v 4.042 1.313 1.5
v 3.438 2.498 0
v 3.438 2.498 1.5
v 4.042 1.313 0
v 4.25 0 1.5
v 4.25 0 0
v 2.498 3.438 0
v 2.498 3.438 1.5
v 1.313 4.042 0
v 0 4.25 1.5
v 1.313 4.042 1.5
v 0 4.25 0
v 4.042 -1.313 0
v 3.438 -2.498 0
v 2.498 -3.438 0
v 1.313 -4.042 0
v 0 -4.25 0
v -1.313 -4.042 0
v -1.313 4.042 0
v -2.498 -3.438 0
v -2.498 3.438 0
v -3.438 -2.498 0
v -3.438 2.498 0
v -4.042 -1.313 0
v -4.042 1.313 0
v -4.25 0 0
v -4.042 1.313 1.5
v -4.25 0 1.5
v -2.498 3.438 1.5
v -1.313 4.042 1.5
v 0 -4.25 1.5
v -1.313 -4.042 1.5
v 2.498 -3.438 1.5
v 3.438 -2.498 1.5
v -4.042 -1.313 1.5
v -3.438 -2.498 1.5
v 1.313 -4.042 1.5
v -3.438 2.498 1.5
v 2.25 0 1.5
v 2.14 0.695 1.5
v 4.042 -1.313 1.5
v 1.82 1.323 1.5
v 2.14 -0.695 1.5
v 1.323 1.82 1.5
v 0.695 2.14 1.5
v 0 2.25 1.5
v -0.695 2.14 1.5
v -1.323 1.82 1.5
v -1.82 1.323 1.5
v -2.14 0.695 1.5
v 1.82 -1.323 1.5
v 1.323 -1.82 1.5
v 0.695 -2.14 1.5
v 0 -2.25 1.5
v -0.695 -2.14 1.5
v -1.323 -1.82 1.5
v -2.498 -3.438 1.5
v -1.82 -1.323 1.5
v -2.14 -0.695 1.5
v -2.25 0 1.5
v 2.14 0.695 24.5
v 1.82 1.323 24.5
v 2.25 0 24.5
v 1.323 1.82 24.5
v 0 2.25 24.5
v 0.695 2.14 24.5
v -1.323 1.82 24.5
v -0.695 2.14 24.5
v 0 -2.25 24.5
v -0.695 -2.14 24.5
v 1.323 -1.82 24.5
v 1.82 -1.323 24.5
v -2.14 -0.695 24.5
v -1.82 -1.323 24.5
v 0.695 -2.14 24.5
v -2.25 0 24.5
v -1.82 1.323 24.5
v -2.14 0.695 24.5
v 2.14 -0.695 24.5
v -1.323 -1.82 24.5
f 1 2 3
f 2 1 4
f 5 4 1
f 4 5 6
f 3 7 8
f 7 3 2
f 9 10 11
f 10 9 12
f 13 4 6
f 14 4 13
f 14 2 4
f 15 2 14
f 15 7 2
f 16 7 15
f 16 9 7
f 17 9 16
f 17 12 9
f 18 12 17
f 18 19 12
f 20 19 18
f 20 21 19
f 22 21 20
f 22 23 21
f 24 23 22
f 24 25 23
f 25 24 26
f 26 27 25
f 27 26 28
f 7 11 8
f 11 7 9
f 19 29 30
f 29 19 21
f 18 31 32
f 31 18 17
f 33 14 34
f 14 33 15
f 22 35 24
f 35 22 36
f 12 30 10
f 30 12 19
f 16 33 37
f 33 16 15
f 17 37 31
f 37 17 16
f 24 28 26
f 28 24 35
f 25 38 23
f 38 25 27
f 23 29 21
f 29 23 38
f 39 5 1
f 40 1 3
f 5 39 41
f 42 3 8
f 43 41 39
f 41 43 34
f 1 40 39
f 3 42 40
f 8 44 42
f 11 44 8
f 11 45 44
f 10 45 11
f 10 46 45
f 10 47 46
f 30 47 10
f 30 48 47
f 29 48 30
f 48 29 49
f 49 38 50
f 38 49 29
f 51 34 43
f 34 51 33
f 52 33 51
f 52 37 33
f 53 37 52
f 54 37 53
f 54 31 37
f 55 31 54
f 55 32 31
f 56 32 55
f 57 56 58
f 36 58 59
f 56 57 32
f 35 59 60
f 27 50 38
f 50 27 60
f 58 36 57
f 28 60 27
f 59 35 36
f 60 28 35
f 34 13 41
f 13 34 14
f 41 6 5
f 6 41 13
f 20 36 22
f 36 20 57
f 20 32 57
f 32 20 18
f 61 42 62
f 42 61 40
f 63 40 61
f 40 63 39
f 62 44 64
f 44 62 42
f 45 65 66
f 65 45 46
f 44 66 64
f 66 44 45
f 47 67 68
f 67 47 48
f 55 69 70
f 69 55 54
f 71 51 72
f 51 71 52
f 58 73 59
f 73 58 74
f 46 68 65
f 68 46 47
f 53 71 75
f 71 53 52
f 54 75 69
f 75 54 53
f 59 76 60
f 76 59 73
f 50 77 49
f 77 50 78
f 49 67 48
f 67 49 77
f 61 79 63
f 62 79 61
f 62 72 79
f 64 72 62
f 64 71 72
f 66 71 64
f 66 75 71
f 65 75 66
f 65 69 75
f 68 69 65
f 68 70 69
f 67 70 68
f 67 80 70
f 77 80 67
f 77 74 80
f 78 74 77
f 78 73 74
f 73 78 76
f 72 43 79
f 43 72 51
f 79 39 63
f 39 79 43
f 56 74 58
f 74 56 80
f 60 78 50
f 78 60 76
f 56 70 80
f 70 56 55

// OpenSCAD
// file: joystick_defines.scad
/*
	OpenJoystick - A project creating affordable, open source, 3D-printable custom flight-sim joysticks for everyone
	Copyright (C) 2012 Travis John Howse

	This program is free software: you can redistribute it and/or modify
	it under the terms of the GNU General Public License as published by
	the Free Software Foundation, either version 3 of the License, or
	(at your option) any later version.

	This program is distributed in the hope that it will be useful,
	but WITHOUT ANY WARRANTY; without even the implied warranty of
	MERCHANTABILITY or FITNESS FOR A PARTICULAR PURPOSE.  See the
	GNU General Public License for more details.

	You should have received a copy of the GNU General Public License
	along with this program.  If not, see <http://www.gnu.org/licenses/>.
*/

// Standard skate bearing
bearing_inside_dia = 8;
bearing_outside_dia = 22;
bearing_thickness = 7;

// Arbitrary value
shaft_dia = 16;

zff = 0.005;

extrusion_width = 0.8; // Used for single-wall support.

// Set this to 1 to translate everything to printable mode
printable_mode = 0;

// Gimbal core block sizes 
gimbal_core_x = 50;
gimbal_core_y = 30;
gimbal_core_z = gimbal_core_y;

// Gimbal frame sizes 
gimbal_frame_thickness = 10; 

circle_faces = 20;
$fn=circle_faces;

// The 1.8 is 2sin(45)ish, the maximum y on the xy plane the core can occupy
gimbal_frame_x = gimbal_core_x+2*gimbal_frame_thickness+2; // 2mm for washers
gimbal_frame_y = (gimbal_core_y * 1.8)+gimbal_frame_thickness;

// Frame is big enough to stop the core colliding at 45 degree rotation.
gimbal_frame_z = sqrt(pow(gimbal_core_z,2)/2) * 2 + 2; // 2 fudge to allow for clearance at tips.

max_angle = 45; // Not much comes off this, should probably build it in more places.

module bearing(hole,outer_puff)
{
	difference()
	{
		cylinder(h=bearing_thickness, r = (bearing_outside_dia/2)+outer_puff);

		if (hole)
		{
			translate([0,0,-zff])
				cylinder(h=9, r = (bearing_inside_dia/2));
		}
	}
}

// Hat sizes
// Note that many other settings for the hats are in their own .scad, only stuff relevant to the rest of the stick is here.
pb_xy = 6;
pb_z = 4; // Height minus pushbutton
pb_btn_z = 1;
pb_total_z = pb_z+pb_btn_z;
pb_btn_dia = 3.5;
pb_leg_x = 4;
pb_leg_y = 5;
pb_leg_z = 0.7;

lever_switch_x = 12.85;
lever_switch_y = 6.5;
lever_switch_z = 5.8;

4_way_hat_base_dia = 18;
4_way_hat_base_base_z = 1.5; // Base thickness
4_way_hat_base_z = pb_xy + 4_way_hat_base_base_z;
4_way_hat_base_screw_dia = 5;
4_way_hat_base_screw_head_dia = 8.25;
4_way_hat_base_screw_head_thk = 3;
4_way_hat_wire_gap = 3;
4_way_hat_cutout_z = 4_way_hat_base_z + 4_way_hat_base_screw_head_thk;

4_way_hat_peg_stem_hole_z = 4;

// Grip sizes
grip_height = 100;
grip_diameter = 44;
grip_clip = 33;
grip_rest_thickness = 5;
grip_rest_diameter = 80;
grip_cms_height_offset = 50;
grip_cms_offset = -5;
grip_cms_angle = 30;
grip_cms_stub_length = 40;
grip_cms_stub_diameter = 4_way_hat_base_dia;
grip_cms_twist = 15;

grip_head_offset_x = -10;
grip_head_box_x = 4_way_hat_base_dia * 2.5;
grip_head_box_y = 4_way_hat_base_dia * 2.2;
grip_head_box_z = 4_way_hat_base_dia * 2;

joystick_head_trigger_thickness = pb_xy;

my_layer_thickness = 0.35;

joystick_big_btn_height = 8;
joystick_big_btn_diameter = 8.0;
joystick_big_btn_clippyness = 3;

headbolt_x = 10.8;
headbolt_y = -9;
headbolt_z = -11;
headbolt_extra = 8;

module hat_cutout(bloat)
{
	// Very similar to a hat, but it has a cross on the bottom and a peg to indicate where the cables will be run.
	translate([0,0,-4_way_hat_wire_gap-4_way_hat_base_z])
	union()
	{
		translate([0,0,4_way_hat_wire_gap])cylinder(r=(4_way_hat_base_dia/2)*bloat,h=4_way_hat_base_z);
		
		intersection()
		{
			cylinder(r=(4_way_hat_base_dia/2)*bloat,h=4_way_hat_base_z);
			union()
			{
				cube([100, pb_xy, 10],true);
				cube([pb_xy, 100, 10],true);
			}
		}
		translate([0,0,-4_way_hat_base_screw_head_thk+4_way_hat_wire_gap]) cylinder(r=(4_way_hat_base_screw_head_dia/2),h=4_way_hat_base_screw_head_thk,$fn=circle_faces);
	}
}

module pb(puff, legdir)
{
	translate([0,0,pb_z/2])
	{
		// Puff set to 1 if you want a realistic model of a button.
		// Puff variable used for making holes in things bigger than the button size
		cube([pb_xy*puff,pb_xy*puff,pb_z*puff],center=true);
	
		// Button knob itself
		translate([0,0,pb_z/2-zff])
			cylinder(r=(pb_btn_dia/2),h=pb_btn_z,$fn=circle_faces);
	
		// Button legs
		if (legdir == 0)
		{
			translate([0,-pb_xy/2-pb_leg_y/2+zff,-pb_z/2+pb_leg_z/2+0.8])
				cube([pb_xy,pb_leg_y,pb_leg_z],center=true);
		} else {
			translate([0,-pb_xy/2+pb_leg_z/2+zff-pb_leg_z,-pb_z/2-pb_leg_y/2+0.8])
				cube([pb_xy,pb_leg_z,pb_leg_y],center=true);
		}
	}

}

module bolt(cap_r, cap_z, shaft_r, shaft_z,slot_len)
{
	// Hex head bolt for holding head together
	if (shaft_z <= slot_len)
	{
		echo("NO! Don't make the threaded length the same as the total.");
	}
	union()
	{
		cylinder(r=cap_r,h=cap_z);
		translate([0,0,cap_z]) cylinder(r=shaft_r+0.15, h=slot_len);
		translate([0,0,cap_z+slot_len]) cylinder(r=shaft_r, h=shaft_z-slot_len);
	}
}

module fillet(radius, length)
{
	translate([-zff,0,-zff]) difference()
	{
		cube([radius,length,radius]);
		translate([radius,length+zff,radius]) rotate([90,0,0]) cylinder(r=radius,h=length+2*zff);
	}
}
// main file
/*
	OpenJoystick - A project creating affordable, open source, 3D-printable custom flight-sim joysticks for everyone
	Copyright (C) 2012 Travis John Howse

	This program is free software: you can redistribute it and/or modify
	it under the terms of the GNU General Public License as published by
	the Free Software Foundation, either version 3 of the License, or
	(at your option) any later version.

	This program is distributed in the hope that it will be useful,
	but WITHOUT ANY WARRANTY; without even the implied warranty of
	MERCHANTABILITY or FITNESS FOR A PARTICULAR PURPOSE.  See the
	GNU General Public License for more details.

	You should have received a copy of the GNU General Public License
	along with this program.  If not, see <http://www.gnu.org/licenses/>.
*/

include <joystick_defines.scad>

// See joystick_defines for most of the guts.

//translate([0,0,10])
//	4_way_hat_washer();
//translate([0,0,13])
//	switch_hat_saddle();
//  switch_hat_hanoi();
//pb(1);

module hat_base(numDirs)
{
	difference()
	{
		cylinder(r=(4_way_hat_base_dia/2), h=4_way_hat_base_z, $fn=circle_faces);
		
		translate([0,pb_total_z+(4_way_hat_base_screw_dia/2),4_way_hat_base_z-pb_xy/2+zff])
			rotate([90,0,0])
				pb(1.02,0);
		translate([0,-pb_total_z-(4_way_hat_base_screw_dia/2),4_way_hat_base_z-pb_xy/2+zff])
			rotate([-90,180,0])
				pb(1.02,0);
		if (numDirs==4)
		{
			translate([pb_total_z+(4_way_hat_base_screw_dia/2),0,4_way_hat_base_z-pb_xy/2+zff])
				rotate([90,0,-90])
					pb(1.02,0);
			translate([-pb_total_z-(4_way_hat_base_screw_dia/2),0,4_way_hat_base_z-pb_xy/2+zff])
				rotate([-90,180,-90])
					pb(1.02,0);
//			// Now chop the bit out of the middle
			translate([0,0,4_way_hat_base_base_z+zff])
				//cube([4_way_hat_base_screw_dia+2*pb_btn_z+zff,4_way_hat_base_screw_dia+2*pb_btn_z+zff,10],center=true);
                cylinder(r=sqrt(pow((pb_btn_dia/2),2) + pow((4_way_hat_base_screw_dia/2+pb_btn_z),2)),h=10,$fn=circle_faces);
		} else	{
			// Now chop the bit out of the middle
			translate([0,0,4_way_hat_base_base_z+5])
				cube([4_way_hat_base_screw_dia,4_way_hat_base_screw_dia+2*pb_btn_z+zff,10],center=true);
		}

		// Now chop the bit out of the middle
		/*translate([0,0,4_way_hat_base_base_z+5])
			cube([pb_xy+zff,pb_xy+zff,10],center=true);*/

		// Screw
		translate([0,0,-1])
            union()
            {
                rotate([0,5,0]) cylinder(r=4_way_hat_base_screw_dia/2, h=4_way_hat_base_z*1, $fn=circle_faces);
                rotate([0,-5,0]) cylinder(r=4_way_hat_base_screw_dia/2, h=4_way_hat_base_z*1, $fn=circle_faces);
                rotate([5,0,0]) cylinder(r=4_way_hat_base_screw_dia/2, h=4_way_hat_base_z*1, $fn=circle_faces);
                rotate([-5,0,0]) cylinder(r=4_way_hat_base_screw_dia/2, h=4_way_hat_base_z*1, $fn=circle_faces);
                cylinder(r=4_way_hat_base_screw_dia/2, h=4_way_hat_base_z*1, $fn=circle_faces);
            }
	}		
}

module hat_voids(numDirs)
{
	difference()
	{
		cylinder(r=4_way_hat_base_dia/2, h=4_way_hat_base_z);		
		hat_base(numDirs);
	}
}

module switch_hat_saddle()
{
	step_size = 2; // Won't really work for anything other than 2, sorry.
	num_steps = 4_way_hat_base_dia / step_size;
	switch_hat_saddle_base_depth = 4_way_hat_peg_stem_hole_z;


	union()
	{
		translate([0,0,switch_hat_saddle_base_depth])
			intersection()
			{
				cylinder(r = (4_way_hat_base_dia/2), h = 10, $fn=circle_faces);
				for (n = [0:num_steps])
				{
					translate([-(4_way_hat_base_dia/2)+n*step_size+0.25*step_size,0,0])
						cube([step_size, 4_way_hat_base_dia, abs((num_steps/2)-n)*1.5],center=true);
				}
			}
		difference()
		{
			cylinder(r = (4_way_hat_base_dia/2), h = switch_hat_saddle_base_depth, $fn=circle_faces);
			translate([0,0,-zff])
				#cylinder(r=(4_way_hat_base_screw_dia/2), h =switch_hat_saddle_base_depth, $fn=circle_faces);
		}
	}
}

module switch_hat_hanoi()
{
	
	difference()
	{
		union()
		{
			cylinder(r = (4_way_hat_base_dia/2), h = 2, $fn=circle_faces);
			translate([0,0,2])
			{
				for (n = [1:8])
				{
					cylinder(r = (4_way_hat_base_dia/2 - (n-1)), h = n*0.7, $fn=circle_faces);
				}
			}
		}
		translate([0,0,-zff])
			cylinder(r=(4_way_hat_base_screw_dia/2), h = 4_way_hat_peg_stem_hole_z, $fn=circle_faces);
	}	
}

module 4_way_hat_washer()
{
	difference()
	{
		cylinder(r=(4_way_hat_base_dia/2), h = 1, $fn=circle_faces);
		translate([0,0,-zff])
			cylinder(r=(4_way_hat_base_screw_dia/2), h = 1+2*zff, $fn=circle_faces);
	}
}

module hat_stem(height)
{
	bolt(8.5/2, 1.5, 4.5/2, height,0);
}
	
//hat_stem(11); // Face hats
hat_stem(23); // CMS
//switch_hat_hanoi();
